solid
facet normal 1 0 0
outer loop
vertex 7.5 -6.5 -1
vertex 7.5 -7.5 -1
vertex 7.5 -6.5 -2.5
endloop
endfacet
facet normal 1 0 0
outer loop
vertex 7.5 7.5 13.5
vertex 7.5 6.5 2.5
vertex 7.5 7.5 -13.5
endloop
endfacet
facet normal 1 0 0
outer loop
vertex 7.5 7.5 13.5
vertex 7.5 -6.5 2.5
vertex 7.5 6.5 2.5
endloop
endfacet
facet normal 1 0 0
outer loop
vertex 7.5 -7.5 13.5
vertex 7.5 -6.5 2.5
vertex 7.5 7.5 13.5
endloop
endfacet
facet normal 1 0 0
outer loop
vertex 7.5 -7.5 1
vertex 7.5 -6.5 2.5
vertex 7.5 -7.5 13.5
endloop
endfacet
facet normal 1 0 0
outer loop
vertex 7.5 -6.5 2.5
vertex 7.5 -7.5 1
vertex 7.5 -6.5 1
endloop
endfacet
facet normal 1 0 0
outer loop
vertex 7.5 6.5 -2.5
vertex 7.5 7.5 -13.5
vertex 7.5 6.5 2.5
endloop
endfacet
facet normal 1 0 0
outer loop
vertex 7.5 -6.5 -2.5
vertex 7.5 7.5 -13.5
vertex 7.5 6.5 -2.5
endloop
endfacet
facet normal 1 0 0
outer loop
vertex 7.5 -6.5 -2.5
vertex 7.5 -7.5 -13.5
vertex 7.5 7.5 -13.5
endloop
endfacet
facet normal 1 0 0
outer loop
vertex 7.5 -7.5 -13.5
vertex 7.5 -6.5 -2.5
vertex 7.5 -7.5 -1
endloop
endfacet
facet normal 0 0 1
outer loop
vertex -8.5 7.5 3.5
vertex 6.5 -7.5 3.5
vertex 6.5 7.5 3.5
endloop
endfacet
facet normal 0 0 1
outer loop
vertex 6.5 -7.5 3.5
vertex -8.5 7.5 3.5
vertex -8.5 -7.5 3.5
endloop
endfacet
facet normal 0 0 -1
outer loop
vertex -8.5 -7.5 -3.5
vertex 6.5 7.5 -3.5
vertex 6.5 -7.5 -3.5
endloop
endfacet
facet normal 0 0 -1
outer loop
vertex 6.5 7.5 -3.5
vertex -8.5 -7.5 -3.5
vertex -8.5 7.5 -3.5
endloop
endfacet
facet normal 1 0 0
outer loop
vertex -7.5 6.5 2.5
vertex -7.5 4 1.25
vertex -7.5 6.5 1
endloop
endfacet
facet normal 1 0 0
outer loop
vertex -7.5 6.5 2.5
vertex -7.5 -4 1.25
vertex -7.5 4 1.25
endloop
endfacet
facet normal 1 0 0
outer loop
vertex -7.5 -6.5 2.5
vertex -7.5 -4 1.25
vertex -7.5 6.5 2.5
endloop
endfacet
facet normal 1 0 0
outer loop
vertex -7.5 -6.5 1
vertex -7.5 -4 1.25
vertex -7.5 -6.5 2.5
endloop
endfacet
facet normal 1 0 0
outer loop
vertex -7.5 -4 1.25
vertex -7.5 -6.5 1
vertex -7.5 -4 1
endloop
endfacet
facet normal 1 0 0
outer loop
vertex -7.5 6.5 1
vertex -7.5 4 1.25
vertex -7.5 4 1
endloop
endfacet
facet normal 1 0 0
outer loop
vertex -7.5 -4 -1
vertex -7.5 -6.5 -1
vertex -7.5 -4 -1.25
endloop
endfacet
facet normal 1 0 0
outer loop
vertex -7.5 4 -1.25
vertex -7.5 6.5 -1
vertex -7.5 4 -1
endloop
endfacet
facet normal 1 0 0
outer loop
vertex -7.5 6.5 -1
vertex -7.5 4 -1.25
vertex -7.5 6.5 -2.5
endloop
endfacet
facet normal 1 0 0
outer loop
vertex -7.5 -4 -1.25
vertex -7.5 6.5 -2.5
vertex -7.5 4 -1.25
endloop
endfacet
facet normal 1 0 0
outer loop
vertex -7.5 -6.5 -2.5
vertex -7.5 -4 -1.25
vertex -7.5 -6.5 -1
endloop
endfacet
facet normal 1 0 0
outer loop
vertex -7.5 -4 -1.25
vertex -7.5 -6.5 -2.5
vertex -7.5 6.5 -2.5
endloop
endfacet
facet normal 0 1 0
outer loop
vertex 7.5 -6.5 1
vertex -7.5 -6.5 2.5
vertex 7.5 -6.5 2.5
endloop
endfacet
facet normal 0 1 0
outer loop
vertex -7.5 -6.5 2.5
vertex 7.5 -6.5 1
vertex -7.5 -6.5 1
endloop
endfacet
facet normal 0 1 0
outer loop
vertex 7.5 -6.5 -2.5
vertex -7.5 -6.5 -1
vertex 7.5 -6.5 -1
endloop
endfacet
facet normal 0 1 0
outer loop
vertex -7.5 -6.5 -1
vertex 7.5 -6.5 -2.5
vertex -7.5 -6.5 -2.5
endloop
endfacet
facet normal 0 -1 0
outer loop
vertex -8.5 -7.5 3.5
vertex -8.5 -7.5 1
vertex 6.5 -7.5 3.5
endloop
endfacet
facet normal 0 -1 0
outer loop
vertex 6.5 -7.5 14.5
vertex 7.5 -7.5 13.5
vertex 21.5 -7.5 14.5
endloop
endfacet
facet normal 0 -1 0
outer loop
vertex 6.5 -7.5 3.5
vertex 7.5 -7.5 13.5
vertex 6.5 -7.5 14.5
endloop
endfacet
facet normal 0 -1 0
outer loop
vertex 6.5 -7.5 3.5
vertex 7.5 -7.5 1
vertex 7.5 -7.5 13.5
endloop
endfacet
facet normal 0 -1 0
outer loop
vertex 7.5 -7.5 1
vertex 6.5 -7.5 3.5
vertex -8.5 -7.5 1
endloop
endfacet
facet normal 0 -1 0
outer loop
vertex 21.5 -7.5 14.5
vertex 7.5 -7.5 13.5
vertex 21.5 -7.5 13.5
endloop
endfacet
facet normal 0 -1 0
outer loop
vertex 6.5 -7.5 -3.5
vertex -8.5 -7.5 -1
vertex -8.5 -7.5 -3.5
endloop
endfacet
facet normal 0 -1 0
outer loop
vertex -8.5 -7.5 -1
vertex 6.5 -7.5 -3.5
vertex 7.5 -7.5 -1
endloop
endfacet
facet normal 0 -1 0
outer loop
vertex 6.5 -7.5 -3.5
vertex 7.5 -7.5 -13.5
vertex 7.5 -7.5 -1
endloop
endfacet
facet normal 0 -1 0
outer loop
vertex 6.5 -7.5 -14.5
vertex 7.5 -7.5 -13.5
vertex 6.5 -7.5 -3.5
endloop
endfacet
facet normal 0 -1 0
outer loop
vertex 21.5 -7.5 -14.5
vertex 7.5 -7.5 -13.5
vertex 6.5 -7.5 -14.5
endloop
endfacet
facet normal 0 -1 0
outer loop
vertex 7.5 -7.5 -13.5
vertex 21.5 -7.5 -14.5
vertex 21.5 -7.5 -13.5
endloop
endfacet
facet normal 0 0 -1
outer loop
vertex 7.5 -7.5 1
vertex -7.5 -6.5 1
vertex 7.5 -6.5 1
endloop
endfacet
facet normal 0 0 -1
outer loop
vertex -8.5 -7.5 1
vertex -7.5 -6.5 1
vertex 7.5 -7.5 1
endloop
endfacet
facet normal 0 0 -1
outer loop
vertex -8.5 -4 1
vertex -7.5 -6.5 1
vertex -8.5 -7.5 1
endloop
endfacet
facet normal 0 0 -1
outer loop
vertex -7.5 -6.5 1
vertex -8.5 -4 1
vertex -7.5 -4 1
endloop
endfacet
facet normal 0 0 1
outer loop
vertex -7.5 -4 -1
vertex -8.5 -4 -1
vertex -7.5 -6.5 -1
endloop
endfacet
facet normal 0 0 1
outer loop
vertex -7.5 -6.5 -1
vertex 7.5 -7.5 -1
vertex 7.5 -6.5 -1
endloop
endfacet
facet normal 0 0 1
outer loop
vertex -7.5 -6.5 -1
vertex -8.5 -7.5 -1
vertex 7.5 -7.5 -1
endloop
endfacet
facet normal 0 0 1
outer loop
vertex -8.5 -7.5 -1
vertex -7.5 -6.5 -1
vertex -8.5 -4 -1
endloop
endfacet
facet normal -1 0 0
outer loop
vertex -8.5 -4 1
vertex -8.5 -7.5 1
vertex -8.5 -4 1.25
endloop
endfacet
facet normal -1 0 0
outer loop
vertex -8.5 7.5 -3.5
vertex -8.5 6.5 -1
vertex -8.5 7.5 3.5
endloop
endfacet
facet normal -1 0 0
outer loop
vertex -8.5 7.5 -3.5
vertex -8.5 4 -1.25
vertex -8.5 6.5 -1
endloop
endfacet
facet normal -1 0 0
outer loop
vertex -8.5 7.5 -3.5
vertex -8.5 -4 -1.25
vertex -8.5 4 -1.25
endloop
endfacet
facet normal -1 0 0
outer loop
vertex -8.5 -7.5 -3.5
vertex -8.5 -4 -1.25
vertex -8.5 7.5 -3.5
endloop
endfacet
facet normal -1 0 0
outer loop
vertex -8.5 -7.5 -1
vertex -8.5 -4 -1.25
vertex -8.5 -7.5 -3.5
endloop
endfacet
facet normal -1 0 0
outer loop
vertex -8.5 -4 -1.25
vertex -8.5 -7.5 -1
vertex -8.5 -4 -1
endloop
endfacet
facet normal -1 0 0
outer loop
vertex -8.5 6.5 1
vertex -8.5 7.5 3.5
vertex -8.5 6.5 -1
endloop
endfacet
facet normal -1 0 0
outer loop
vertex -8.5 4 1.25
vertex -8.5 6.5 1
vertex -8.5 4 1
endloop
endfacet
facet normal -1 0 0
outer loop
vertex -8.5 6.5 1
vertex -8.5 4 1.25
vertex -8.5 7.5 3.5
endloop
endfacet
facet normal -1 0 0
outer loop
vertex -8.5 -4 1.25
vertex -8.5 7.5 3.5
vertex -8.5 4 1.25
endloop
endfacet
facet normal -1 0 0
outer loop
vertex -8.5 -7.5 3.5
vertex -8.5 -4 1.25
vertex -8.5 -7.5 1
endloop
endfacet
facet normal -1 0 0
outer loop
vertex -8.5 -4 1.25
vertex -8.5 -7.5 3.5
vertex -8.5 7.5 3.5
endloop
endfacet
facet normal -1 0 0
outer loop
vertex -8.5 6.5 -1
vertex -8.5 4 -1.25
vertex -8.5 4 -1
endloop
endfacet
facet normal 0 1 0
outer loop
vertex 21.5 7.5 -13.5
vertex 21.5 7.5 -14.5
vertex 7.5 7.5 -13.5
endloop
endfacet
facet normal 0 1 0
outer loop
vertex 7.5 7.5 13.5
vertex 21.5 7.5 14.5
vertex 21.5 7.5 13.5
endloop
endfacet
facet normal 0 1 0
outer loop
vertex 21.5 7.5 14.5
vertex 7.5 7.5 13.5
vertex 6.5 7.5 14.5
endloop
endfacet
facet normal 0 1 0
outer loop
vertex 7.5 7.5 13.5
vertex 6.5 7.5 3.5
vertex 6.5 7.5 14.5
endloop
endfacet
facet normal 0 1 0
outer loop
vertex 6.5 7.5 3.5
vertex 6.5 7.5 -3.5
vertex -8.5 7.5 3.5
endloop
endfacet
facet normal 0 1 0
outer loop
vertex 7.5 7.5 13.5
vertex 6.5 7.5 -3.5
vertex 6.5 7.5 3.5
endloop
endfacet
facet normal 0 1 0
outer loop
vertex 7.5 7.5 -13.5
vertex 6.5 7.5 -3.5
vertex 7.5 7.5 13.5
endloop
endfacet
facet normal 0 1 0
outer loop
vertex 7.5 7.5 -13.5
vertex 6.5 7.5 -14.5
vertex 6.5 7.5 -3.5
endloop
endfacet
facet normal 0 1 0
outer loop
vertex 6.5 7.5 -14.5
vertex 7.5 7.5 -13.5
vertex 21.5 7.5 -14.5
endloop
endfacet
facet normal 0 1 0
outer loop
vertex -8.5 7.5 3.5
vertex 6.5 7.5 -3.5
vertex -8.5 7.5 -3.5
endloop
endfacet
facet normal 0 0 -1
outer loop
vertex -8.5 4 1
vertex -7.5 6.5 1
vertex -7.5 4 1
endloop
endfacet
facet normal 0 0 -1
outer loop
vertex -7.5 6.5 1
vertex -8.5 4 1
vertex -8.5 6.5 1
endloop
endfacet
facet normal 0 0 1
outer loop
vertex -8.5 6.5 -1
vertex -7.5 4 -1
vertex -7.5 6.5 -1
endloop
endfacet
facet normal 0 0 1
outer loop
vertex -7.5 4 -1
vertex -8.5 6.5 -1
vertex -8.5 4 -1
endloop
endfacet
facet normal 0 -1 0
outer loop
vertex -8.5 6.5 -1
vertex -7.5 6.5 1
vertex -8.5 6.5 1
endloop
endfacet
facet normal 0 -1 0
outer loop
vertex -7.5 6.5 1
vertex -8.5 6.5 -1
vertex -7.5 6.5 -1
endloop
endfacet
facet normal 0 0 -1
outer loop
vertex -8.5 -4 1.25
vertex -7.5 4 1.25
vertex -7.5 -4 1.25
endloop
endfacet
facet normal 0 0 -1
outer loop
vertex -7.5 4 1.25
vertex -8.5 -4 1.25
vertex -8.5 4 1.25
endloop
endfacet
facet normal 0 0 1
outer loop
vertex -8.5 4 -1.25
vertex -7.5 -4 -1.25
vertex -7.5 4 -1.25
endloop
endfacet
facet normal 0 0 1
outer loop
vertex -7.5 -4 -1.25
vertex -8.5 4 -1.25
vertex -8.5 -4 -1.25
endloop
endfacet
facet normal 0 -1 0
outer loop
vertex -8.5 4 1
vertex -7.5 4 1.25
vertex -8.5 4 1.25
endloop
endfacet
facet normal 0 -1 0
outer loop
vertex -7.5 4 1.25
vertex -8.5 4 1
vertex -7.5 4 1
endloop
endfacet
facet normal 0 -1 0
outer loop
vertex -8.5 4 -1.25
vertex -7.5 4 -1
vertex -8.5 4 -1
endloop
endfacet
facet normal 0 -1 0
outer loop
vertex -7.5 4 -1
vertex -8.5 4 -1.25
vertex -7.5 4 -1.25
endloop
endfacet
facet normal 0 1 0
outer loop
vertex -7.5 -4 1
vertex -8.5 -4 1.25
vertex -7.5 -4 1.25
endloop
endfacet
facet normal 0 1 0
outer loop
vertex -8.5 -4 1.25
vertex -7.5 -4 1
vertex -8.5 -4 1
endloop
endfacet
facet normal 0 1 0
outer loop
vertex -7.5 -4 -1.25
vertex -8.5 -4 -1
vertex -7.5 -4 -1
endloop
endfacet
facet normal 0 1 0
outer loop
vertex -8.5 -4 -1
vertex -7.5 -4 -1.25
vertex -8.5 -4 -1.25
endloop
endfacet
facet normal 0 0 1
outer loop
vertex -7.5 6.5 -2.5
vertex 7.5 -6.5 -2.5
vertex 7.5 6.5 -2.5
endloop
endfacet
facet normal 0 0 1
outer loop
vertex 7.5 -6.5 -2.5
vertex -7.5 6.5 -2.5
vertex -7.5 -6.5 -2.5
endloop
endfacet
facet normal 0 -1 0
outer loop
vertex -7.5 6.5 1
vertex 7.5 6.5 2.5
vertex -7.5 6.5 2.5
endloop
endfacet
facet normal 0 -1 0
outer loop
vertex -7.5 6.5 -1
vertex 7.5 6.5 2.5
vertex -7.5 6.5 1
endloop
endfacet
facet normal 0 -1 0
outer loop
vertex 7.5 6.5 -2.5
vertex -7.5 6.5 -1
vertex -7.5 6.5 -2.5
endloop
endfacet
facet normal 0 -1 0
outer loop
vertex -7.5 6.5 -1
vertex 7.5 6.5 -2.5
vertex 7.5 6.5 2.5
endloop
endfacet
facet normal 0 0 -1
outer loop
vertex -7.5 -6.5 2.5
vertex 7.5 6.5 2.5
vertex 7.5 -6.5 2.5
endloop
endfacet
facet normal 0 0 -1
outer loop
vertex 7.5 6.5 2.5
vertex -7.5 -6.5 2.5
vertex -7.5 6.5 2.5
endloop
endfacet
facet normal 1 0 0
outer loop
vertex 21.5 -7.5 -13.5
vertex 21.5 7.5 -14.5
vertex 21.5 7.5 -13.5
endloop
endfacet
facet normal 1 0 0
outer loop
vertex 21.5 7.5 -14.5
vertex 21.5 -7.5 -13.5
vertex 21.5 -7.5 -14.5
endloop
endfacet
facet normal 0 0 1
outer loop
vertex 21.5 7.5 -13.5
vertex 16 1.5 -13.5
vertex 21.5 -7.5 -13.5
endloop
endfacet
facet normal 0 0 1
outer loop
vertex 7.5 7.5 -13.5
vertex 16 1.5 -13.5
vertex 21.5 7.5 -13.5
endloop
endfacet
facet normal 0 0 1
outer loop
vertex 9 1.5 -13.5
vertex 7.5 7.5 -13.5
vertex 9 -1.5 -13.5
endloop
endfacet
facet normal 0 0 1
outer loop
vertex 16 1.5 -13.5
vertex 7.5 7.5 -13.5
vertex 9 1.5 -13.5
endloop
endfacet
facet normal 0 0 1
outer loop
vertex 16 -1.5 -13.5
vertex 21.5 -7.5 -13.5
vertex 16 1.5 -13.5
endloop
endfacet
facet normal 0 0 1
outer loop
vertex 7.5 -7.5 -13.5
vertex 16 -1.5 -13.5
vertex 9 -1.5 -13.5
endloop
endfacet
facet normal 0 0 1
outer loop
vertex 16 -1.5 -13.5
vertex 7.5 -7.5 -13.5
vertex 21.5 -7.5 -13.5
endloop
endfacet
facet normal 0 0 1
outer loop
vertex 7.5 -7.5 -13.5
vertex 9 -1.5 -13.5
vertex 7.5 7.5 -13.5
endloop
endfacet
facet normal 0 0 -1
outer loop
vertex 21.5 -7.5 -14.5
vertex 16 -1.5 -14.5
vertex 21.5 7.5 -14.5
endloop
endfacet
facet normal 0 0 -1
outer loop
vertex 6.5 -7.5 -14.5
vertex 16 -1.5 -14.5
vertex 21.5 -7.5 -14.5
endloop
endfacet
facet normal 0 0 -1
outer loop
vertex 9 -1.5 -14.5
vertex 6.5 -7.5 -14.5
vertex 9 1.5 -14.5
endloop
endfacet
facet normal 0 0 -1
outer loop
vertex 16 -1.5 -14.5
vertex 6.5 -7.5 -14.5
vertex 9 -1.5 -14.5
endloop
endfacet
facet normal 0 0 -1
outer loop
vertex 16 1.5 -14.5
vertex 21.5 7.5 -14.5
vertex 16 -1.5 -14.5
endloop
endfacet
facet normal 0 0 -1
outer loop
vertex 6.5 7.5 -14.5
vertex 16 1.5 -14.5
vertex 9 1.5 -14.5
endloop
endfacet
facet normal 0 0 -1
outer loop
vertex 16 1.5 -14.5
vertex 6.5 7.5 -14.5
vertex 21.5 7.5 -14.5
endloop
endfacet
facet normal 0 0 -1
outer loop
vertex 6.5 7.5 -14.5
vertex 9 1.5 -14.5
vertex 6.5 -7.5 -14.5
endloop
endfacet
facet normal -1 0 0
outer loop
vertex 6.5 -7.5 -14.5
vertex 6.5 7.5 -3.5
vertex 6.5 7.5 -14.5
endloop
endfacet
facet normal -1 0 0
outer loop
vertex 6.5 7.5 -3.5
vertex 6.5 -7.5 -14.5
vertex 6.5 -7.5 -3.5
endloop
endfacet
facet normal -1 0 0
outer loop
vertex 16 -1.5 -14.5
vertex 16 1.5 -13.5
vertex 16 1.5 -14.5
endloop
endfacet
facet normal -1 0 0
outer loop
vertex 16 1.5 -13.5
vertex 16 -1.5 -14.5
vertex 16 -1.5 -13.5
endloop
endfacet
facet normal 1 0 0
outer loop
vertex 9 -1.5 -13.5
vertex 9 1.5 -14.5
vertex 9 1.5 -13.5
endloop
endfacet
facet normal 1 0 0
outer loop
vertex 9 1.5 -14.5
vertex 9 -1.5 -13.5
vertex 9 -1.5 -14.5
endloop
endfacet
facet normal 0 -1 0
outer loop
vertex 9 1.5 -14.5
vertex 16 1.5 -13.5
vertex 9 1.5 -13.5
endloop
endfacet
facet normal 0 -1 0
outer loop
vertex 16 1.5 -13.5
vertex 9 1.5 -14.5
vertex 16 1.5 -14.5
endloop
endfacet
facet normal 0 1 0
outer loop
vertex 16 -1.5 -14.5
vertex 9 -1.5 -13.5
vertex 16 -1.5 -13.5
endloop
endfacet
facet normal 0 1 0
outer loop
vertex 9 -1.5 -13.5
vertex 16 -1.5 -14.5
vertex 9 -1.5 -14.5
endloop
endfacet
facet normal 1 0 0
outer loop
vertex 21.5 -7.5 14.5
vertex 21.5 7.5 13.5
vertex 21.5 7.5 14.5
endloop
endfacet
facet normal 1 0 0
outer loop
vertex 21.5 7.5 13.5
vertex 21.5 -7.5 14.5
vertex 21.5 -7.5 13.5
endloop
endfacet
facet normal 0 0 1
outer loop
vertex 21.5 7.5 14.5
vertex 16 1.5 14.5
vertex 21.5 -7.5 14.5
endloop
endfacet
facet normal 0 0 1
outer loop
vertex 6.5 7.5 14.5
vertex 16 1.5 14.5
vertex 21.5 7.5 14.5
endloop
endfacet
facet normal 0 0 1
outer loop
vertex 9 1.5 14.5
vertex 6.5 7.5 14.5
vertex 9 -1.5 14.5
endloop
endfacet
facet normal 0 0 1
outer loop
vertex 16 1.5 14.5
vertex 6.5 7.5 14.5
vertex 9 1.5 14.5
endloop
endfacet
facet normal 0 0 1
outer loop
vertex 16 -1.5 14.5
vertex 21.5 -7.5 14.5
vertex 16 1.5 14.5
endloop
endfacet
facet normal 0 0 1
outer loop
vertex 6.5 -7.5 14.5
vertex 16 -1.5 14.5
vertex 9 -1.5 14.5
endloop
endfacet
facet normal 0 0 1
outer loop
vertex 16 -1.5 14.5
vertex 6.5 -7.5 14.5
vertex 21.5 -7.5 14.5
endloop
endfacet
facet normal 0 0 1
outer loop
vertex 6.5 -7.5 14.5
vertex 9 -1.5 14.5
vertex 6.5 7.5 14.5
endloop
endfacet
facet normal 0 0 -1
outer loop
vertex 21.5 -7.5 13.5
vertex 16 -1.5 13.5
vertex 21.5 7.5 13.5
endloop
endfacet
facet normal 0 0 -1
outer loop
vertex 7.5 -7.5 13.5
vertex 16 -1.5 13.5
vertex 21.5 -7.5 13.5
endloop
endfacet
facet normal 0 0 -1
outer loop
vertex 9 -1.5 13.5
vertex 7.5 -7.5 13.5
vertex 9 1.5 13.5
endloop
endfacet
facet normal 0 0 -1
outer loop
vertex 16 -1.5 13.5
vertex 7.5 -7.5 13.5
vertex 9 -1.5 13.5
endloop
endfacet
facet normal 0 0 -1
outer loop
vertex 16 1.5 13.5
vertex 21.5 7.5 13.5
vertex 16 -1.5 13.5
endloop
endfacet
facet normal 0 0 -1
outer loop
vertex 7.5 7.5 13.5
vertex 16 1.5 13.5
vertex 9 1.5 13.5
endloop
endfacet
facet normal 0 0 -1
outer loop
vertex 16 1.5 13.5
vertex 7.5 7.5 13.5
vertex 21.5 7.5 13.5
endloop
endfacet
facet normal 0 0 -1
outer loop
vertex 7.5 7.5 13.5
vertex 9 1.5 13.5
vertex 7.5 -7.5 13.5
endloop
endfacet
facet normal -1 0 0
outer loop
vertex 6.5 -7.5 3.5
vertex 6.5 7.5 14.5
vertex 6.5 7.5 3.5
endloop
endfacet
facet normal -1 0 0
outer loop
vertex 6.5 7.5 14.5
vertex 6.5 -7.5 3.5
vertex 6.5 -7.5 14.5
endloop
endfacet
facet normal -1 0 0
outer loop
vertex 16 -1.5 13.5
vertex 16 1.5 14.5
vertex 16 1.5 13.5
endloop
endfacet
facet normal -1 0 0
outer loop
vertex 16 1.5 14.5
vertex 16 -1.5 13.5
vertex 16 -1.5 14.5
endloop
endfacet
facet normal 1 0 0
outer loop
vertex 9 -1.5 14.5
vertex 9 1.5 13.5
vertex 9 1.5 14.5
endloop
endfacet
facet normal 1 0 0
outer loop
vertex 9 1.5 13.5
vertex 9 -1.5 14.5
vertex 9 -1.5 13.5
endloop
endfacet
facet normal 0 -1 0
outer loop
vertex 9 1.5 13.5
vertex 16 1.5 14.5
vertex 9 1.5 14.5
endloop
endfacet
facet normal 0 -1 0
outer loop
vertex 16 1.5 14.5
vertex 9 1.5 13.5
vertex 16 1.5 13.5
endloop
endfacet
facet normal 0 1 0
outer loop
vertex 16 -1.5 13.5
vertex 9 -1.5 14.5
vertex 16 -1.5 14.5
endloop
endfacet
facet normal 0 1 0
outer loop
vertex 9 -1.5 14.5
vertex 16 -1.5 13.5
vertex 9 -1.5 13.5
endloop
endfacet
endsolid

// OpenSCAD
//----------Variables----------
WallThickness = 1;
USBThick = 5;
USBLength = 13;
USBHeight = 15;
CableThick = 2.5;
CableWidth = 8;

//----------Code----------
color("RoyalBlue")union(){
    //USB part
    color("gray")union(){
        //Bottom
        color("green")translate([0,0,-(USBThick+WallThickness)/2])cube([USBHeight, USBLength, WallThickness], center=true);
        //Top
        color("Lightgreen")translate([0,0,(USBThick+WallThickness)/2])cube([USBHeight, USBLength, WallThickness], center=true);
        //Right
        color("blue")translate([0,(USBLength+WallThickness)/2,0])cube([USBHeight, WallThickness, USBThick+(2*WallThickness)], center=true);
        //Left
        color("purple")translate([0,-(USBLength+WallThickness)/2,0])difference(){
            cube([USBHeight, WallThickness, USBThick+(2*WallThickness)], center=true);
            cube([USBHeight+WallThickness, WallThickness*3, CableThick-0.5], center=true);
        };
        //Back
        color("red")translate([-(USBHeight+WallThickness)/2,0,0])difference(){
            cube([WallThickness, USBLength+2*WallThickness, USBThick+2*WallThickness], center=true);
            translate([0,-WallThickness,0])cube([2*WallThickness, USBLength+2*WallThickness, (CableThick-0.5)], center=true);
            cube([2*WallThickness, CableWidth, CableThick], center=true);
        };
    };

    //Holders
    Length = 10;
    //Top
    color("red")translate([(USBHeight-WallThickness)/2, 0, -(Length/2+(USBThick+WallThickness)/2)])cube([WallThickness, USBLength+2*WallThickness, Length+WallThickness], center=true);
    translate([USBHeight-WallThickness, 0, -(Length+(USBThick+2*WallThickness)/2+WallThickness/2)])difference(){
        color("orange")cube([USBHeight,USBLength+2*WallThickness,WallThickness], center=true);
        translate([-1.5,0,0])cube([7,3,WallThickness*3], center=true);
    };

    //Bottom
    color("green")translate([(USBHeight-WallThickness)/2, 0, (Length/2+(USBThick+WallThickness)/2)])cube([WallThickness, USBLength+2*WallThickness, Length+WallThickness], center=true);
    translate([USBHeight-WallThickness, 0, (Length+(USBThick+2*WallThickness)/2+WallThickness/2)])difference(){
        cube([USBHeight,USBLength+2*WallThickness,WallThickness], center=true);
        translate([-1.5,0,0])cube([7,3,WallThickness*3], center=true);
    };
};
